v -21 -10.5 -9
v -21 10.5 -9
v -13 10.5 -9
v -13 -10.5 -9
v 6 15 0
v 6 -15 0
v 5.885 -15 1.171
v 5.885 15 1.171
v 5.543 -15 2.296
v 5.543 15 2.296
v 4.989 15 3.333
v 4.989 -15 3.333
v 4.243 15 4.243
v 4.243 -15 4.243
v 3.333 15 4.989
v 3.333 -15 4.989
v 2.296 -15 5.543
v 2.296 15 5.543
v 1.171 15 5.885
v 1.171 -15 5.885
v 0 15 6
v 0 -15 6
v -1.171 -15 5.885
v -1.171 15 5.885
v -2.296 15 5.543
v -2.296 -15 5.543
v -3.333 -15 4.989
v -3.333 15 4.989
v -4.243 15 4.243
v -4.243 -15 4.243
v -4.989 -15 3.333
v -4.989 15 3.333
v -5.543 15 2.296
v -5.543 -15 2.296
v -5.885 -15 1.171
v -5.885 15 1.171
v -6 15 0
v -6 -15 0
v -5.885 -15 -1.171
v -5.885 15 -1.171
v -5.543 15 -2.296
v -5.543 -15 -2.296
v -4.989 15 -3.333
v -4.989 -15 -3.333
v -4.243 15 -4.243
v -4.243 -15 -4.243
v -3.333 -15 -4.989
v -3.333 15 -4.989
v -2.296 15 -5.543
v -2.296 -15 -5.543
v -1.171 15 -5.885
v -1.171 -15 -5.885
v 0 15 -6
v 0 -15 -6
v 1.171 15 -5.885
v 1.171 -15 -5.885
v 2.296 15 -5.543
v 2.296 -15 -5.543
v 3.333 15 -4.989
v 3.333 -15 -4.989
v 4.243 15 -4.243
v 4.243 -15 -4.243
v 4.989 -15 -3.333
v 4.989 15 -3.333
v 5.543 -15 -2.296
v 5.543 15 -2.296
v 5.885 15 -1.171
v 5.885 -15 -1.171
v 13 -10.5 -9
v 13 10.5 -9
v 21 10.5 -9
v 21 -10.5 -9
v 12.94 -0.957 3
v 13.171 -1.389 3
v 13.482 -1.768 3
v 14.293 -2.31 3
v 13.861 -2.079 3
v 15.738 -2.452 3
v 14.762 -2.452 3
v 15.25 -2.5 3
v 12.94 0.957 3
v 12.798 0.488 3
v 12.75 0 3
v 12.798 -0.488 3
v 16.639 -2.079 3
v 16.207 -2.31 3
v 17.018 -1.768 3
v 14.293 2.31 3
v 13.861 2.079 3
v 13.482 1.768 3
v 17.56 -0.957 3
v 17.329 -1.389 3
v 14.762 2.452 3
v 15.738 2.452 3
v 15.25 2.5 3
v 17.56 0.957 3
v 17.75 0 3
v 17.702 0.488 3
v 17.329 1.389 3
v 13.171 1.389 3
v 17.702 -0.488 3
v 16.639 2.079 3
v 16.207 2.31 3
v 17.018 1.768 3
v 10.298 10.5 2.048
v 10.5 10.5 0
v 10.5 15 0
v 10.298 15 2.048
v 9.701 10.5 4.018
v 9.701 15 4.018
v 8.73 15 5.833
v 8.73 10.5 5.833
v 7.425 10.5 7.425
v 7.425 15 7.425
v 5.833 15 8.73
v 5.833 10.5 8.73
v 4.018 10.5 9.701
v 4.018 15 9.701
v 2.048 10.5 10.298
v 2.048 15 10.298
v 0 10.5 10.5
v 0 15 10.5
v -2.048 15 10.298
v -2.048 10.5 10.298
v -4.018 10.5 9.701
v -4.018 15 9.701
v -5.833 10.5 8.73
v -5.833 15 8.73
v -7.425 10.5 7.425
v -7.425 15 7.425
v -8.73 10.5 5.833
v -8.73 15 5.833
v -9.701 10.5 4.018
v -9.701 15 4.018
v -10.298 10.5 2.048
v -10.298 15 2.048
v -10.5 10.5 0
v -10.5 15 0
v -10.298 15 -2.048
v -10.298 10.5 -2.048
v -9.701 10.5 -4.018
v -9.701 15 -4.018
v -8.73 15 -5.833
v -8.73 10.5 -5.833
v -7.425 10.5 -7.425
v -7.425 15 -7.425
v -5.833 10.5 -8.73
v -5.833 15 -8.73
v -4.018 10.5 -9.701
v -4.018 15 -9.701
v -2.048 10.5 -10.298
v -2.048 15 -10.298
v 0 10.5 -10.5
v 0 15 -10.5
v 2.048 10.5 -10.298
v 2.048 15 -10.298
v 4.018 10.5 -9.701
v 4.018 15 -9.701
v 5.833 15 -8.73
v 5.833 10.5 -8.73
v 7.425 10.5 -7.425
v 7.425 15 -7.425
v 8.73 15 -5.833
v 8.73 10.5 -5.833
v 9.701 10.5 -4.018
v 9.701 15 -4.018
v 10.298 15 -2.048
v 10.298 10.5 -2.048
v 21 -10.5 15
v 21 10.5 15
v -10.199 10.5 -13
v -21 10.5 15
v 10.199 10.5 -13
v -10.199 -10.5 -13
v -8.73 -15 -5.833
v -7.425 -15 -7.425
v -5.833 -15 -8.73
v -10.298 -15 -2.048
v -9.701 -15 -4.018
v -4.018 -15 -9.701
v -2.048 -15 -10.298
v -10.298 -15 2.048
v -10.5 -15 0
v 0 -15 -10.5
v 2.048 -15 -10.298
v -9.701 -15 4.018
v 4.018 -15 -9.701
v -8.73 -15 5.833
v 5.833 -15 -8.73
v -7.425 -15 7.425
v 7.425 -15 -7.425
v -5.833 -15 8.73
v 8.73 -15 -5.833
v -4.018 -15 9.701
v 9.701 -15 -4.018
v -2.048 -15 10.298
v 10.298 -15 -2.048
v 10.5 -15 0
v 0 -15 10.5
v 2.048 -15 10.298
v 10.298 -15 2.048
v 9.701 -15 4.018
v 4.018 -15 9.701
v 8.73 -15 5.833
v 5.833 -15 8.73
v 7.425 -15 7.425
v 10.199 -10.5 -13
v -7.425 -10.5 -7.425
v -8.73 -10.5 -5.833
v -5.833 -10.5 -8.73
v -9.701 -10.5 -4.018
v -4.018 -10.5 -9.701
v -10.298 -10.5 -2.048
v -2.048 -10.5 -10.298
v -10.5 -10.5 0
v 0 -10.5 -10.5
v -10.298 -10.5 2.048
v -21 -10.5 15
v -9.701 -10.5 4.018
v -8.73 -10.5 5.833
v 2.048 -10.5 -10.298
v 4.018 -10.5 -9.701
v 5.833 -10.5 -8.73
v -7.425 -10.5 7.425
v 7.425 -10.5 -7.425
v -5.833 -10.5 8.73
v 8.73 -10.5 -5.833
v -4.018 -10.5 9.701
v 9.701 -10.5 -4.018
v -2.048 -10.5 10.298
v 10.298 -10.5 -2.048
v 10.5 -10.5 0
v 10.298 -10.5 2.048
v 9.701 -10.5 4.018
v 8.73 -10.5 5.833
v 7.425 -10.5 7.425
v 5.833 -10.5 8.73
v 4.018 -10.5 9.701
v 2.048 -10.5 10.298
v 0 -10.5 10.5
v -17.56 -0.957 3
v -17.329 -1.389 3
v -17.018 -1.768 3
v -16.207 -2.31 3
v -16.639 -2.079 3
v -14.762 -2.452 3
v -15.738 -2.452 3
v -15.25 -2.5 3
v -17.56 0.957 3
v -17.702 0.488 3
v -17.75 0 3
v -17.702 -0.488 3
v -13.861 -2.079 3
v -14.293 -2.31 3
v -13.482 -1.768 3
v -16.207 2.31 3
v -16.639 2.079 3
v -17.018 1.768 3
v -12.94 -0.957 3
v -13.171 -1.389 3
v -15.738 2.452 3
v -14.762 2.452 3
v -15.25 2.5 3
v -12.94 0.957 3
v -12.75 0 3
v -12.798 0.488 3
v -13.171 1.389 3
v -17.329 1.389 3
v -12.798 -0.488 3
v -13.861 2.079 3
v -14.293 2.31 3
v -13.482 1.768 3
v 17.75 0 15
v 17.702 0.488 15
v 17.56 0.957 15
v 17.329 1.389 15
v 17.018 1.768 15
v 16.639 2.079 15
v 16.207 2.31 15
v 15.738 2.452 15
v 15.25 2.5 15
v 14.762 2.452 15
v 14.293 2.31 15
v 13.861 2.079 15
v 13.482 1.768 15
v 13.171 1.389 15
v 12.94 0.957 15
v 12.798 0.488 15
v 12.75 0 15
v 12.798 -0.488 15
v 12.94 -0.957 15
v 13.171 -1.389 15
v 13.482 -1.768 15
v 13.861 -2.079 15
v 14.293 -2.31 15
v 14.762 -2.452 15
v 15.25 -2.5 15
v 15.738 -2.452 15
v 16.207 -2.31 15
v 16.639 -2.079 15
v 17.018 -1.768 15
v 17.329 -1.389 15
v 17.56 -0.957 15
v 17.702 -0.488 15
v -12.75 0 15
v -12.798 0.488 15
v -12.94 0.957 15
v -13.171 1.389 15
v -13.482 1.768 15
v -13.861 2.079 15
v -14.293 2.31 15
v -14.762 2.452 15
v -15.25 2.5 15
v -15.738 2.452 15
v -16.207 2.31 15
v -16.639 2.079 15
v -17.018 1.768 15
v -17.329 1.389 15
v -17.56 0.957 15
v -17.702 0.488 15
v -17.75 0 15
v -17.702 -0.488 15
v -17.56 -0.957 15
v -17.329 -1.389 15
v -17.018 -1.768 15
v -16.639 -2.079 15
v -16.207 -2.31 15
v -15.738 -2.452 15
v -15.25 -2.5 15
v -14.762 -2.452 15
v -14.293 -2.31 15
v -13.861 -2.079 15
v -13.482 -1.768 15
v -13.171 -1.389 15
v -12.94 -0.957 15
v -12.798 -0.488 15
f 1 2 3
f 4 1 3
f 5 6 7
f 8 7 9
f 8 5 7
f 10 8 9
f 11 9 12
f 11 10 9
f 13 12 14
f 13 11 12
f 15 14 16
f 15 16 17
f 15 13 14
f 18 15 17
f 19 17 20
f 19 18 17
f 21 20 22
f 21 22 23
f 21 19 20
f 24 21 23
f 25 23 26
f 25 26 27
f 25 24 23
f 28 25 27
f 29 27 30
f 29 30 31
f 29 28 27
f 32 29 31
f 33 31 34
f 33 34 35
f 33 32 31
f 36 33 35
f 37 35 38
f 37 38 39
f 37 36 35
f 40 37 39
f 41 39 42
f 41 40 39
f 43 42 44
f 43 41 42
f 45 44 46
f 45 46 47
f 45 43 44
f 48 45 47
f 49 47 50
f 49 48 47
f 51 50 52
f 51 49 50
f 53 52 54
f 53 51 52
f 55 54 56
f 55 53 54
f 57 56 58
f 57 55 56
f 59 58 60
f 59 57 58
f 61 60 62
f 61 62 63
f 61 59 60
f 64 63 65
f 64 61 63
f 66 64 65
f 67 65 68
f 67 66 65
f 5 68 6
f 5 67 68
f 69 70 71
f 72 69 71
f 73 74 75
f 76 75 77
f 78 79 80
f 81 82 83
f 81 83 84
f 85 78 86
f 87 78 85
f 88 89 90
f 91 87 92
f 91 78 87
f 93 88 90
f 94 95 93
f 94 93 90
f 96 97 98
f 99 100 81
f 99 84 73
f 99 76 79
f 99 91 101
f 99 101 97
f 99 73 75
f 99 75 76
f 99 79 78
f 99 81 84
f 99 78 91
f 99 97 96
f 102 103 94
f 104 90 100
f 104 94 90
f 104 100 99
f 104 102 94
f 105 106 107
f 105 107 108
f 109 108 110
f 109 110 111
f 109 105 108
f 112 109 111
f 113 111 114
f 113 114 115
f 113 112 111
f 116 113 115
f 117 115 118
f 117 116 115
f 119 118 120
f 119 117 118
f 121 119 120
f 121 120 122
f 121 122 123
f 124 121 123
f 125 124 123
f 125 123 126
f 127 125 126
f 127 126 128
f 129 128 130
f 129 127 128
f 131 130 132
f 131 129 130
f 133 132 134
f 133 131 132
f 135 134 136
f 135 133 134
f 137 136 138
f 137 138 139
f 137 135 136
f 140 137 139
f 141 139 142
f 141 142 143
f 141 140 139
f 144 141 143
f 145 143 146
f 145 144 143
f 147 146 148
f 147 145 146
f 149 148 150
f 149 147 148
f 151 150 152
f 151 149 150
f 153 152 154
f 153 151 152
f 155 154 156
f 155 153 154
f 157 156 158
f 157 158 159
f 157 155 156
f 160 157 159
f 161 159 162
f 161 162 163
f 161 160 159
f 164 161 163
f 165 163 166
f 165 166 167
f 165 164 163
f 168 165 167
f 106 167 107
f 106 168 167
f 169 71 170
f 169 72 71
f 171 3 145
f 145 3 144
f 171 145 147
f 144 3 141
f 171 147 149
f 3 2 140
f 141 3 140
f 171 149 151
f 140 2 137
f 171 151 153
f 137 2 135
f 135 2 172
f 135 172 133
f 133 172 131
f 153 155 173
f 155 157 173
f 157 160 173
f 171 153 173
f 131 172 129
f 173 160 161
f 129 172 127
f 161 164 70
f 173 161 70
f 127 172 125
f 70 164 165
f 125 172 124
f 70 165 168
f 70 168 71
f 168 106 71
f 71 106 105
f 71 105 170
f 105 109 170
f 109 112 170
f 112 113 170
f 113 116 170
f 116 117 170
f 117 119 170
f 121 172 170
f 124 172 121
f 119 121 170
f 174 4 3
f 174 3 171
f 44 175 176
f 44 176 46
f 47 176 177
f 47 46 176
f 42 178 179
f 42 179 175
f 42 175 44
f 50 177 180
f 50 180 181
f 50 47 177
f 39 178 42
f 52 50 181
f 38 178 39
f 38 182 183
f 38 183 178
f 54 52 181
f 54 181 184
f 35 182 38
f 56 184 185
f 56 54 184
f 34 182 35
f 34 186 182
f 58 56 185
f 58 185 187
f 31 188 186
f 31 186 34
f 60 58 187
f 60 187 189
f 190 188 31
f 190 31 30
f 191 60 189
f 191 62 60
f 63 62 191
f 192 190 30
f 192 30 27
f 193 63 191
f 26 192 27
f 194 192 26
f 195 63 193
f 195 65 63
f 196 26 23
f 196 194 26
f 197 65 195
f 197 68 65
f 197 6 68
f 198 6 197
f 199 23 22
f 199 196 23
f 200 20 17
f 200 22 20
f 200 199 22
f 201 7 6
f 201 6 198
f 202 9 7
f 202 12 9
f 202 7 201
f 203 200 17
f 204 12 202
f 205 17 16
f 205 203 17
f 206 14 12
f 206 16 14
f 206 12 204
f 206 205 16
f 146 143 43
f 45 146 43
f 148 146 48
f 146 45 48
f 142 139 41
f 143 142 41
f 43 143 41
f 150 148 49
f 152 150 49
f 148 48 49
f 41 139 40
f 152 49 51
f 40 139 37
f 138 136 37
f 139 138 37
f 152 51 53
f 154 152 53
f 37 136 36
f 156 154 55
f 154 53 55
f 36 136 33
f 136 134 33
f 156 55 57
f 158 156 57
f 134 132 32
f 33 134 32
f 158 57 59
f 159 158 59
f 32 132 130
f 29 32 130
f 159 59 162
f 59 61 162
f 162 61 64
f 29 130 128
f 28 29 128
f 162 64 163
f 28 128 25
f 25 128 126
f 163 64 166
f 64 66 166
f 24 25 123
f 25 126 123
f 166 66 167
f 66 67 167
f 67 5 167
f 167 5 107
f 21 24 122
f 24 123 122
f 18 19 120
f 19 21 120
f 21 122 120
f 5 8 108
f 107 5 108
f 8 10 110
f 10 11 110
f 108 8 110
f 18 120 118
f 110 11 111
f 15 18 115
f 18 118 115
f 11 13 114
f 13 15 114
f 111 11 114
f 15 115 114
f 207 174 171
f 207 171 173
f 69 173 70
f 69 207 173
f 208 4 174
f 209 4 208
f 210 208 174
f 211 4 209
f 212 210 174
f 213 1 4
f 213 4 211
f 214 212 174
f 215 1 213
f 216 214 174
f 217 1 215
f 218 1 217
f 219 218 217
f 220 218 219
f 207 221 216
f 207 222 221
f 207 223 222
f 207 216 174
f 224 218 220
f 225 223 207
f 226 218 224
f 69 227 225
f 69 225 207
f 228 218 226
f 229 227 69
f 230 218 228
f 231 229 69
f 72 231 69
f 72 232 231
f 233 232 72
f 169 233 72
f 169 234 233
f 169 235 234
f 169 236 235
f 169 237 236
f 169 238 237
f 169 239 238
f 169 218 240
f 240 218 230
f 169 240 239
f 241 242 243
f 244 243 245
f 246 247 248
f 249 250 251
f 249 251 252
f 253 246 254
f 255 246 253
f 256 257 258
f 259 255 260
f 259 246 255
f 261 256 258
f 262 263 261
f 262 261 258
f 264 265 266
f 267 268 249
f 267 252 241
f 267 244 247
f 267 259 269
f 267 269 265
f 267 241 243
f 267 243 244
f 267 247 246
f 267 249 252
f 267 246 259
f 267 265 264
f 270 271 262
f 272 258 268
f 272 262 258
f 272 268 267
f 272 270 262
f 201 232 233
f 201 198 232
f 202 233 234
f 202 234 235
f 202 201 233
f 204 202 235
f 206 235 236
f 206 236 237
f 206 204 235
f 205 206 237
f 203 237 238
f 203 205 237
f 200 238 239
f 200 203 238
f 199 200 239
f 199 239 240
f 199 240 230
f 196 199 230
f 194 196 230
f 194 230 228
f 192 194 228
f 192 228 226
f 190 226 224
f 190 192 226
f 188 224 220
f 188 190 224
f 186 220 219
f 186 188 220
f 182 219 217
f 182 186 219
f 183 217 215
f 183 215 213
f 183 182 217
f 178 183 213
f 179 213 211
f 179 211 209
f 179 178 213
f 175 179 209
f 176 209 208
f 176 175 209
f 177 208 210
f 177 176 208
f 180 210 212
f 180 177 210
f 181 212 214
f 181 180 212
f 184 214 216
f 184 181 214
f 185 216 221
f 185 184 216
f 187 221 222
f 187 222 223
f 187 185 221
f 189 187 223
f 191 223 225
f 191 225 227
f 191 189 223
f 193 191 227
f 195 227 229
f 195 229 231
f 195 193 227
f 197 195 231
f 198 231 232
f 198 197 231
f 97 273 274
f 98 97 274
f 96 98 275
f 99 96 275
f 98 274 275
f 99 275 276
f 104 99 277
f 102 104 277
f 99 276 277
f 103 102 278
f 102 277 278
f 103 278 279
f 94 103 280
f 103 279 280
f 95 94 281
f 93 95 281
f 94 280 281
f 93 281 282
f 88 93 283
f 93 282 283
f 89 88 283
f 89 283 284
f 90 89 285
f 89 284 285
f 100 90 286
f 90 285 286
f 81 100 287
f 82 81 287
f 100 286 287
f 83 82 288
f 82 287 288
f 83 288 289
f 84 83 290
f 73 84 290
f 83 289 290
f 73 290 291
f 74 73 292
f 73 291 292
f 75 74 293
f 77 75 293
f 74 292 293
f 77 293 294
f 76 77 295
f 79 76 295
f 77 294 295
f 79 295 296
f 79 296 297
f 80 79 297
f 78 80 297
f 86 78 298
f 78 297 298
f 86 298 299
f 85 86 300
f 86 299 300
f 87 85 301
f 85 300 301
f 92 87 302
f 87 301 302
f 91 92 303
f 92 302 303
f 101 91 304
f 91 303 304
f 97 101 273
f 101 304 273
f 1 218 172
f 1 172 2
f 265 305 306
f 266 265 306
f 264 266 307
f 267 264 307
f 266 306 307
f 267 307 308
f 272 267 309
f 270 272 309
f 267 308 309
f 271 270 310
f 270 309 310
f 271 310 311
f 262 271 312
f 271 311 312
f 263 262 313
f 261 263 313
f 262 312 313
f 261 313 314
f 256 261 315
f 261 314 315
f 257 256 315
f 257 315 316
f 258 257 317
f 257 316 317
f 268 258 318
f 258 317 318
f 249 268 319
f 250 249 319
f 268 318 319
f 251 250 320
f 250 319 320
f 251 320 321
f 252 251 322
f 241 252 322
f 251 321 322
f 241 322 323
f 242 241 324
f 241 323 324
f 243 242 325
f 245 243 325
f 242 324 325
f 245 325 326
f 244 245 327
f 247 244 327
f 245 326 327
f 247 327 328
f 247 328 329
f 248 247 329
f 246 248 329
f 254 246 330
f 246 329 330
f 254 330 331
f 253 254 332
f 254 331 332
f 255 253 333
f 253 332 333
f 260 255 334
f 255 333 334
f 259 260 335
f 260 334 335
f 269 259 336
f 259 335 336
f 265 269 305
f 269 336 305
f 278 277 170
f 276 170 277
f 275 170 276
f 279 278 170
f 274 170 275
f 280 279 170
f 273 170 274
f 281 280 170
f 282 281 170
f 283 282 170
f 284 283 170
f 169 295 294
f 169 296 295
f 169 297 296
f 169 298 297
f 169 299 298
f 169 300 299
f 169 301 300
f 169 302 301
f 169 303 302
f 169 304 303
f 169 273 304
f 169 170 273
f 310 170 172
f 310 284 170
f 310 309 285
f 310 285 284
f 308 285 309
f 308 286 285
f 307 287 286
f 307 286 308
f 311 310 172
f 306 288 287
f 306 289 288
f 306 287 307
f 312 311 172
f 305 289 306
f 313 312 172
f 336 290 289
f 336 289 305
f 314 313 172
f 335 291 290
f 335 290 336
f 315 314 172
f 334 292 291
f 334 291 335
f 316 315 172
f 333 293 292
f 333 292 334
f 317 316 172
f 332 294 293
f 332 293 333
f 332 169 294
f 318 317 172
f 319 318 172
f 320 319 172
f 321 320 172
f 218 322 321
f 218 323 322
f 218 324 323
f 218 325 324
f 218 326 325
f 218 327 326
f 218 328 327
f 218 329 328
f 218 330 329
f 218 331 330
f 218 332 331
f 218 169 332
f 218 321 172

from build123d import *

# Parameters (mm, degrees)
F0_R     = 10.5
F0_R_2   = 6
F1_DEPTH = 15
F2_DEPTH = 10.5
F3_R     = 2.5
F4_DEPTH = 12


with BuildPart() as f1:
    # F0 (on Front) → F1 (new body, symmetric)
    with BuildSketch(Plane.XZ):
        Circle(F0_R)
        Circle(F0_R_2, mode=Mode.SUBTRACT)
    extrude(amount=F1_DEPTH, both=True)

    # F0 (on Front) → F2 (join, symmetric)
    with BuildSketch(Plane.XZ):
        Polygon((21, 15), (0, 15), (-21, 15), (-21, -9), (-13, -9), (-10.1991698472, -13), (10.1991698472, -13), (13, -9), (21, -9), align=None)
        Circle(F0_R, mode=Mode.SUBTRACT)
    extrude(amount=F2_DEPTH, both=True)

    # F3 (on face) → F4 (cut)
    with BuildSketch(Plane.XY.offset(15)):
        with Locations((-15.25, 0)):
            Circle(F3_R)
        with Locations((15.25, 0)):
            Circle(F3_R)
    extrude(amount=-F4_DEPTH, mode=Mode.SUBTRACT)


solid = f1.part
